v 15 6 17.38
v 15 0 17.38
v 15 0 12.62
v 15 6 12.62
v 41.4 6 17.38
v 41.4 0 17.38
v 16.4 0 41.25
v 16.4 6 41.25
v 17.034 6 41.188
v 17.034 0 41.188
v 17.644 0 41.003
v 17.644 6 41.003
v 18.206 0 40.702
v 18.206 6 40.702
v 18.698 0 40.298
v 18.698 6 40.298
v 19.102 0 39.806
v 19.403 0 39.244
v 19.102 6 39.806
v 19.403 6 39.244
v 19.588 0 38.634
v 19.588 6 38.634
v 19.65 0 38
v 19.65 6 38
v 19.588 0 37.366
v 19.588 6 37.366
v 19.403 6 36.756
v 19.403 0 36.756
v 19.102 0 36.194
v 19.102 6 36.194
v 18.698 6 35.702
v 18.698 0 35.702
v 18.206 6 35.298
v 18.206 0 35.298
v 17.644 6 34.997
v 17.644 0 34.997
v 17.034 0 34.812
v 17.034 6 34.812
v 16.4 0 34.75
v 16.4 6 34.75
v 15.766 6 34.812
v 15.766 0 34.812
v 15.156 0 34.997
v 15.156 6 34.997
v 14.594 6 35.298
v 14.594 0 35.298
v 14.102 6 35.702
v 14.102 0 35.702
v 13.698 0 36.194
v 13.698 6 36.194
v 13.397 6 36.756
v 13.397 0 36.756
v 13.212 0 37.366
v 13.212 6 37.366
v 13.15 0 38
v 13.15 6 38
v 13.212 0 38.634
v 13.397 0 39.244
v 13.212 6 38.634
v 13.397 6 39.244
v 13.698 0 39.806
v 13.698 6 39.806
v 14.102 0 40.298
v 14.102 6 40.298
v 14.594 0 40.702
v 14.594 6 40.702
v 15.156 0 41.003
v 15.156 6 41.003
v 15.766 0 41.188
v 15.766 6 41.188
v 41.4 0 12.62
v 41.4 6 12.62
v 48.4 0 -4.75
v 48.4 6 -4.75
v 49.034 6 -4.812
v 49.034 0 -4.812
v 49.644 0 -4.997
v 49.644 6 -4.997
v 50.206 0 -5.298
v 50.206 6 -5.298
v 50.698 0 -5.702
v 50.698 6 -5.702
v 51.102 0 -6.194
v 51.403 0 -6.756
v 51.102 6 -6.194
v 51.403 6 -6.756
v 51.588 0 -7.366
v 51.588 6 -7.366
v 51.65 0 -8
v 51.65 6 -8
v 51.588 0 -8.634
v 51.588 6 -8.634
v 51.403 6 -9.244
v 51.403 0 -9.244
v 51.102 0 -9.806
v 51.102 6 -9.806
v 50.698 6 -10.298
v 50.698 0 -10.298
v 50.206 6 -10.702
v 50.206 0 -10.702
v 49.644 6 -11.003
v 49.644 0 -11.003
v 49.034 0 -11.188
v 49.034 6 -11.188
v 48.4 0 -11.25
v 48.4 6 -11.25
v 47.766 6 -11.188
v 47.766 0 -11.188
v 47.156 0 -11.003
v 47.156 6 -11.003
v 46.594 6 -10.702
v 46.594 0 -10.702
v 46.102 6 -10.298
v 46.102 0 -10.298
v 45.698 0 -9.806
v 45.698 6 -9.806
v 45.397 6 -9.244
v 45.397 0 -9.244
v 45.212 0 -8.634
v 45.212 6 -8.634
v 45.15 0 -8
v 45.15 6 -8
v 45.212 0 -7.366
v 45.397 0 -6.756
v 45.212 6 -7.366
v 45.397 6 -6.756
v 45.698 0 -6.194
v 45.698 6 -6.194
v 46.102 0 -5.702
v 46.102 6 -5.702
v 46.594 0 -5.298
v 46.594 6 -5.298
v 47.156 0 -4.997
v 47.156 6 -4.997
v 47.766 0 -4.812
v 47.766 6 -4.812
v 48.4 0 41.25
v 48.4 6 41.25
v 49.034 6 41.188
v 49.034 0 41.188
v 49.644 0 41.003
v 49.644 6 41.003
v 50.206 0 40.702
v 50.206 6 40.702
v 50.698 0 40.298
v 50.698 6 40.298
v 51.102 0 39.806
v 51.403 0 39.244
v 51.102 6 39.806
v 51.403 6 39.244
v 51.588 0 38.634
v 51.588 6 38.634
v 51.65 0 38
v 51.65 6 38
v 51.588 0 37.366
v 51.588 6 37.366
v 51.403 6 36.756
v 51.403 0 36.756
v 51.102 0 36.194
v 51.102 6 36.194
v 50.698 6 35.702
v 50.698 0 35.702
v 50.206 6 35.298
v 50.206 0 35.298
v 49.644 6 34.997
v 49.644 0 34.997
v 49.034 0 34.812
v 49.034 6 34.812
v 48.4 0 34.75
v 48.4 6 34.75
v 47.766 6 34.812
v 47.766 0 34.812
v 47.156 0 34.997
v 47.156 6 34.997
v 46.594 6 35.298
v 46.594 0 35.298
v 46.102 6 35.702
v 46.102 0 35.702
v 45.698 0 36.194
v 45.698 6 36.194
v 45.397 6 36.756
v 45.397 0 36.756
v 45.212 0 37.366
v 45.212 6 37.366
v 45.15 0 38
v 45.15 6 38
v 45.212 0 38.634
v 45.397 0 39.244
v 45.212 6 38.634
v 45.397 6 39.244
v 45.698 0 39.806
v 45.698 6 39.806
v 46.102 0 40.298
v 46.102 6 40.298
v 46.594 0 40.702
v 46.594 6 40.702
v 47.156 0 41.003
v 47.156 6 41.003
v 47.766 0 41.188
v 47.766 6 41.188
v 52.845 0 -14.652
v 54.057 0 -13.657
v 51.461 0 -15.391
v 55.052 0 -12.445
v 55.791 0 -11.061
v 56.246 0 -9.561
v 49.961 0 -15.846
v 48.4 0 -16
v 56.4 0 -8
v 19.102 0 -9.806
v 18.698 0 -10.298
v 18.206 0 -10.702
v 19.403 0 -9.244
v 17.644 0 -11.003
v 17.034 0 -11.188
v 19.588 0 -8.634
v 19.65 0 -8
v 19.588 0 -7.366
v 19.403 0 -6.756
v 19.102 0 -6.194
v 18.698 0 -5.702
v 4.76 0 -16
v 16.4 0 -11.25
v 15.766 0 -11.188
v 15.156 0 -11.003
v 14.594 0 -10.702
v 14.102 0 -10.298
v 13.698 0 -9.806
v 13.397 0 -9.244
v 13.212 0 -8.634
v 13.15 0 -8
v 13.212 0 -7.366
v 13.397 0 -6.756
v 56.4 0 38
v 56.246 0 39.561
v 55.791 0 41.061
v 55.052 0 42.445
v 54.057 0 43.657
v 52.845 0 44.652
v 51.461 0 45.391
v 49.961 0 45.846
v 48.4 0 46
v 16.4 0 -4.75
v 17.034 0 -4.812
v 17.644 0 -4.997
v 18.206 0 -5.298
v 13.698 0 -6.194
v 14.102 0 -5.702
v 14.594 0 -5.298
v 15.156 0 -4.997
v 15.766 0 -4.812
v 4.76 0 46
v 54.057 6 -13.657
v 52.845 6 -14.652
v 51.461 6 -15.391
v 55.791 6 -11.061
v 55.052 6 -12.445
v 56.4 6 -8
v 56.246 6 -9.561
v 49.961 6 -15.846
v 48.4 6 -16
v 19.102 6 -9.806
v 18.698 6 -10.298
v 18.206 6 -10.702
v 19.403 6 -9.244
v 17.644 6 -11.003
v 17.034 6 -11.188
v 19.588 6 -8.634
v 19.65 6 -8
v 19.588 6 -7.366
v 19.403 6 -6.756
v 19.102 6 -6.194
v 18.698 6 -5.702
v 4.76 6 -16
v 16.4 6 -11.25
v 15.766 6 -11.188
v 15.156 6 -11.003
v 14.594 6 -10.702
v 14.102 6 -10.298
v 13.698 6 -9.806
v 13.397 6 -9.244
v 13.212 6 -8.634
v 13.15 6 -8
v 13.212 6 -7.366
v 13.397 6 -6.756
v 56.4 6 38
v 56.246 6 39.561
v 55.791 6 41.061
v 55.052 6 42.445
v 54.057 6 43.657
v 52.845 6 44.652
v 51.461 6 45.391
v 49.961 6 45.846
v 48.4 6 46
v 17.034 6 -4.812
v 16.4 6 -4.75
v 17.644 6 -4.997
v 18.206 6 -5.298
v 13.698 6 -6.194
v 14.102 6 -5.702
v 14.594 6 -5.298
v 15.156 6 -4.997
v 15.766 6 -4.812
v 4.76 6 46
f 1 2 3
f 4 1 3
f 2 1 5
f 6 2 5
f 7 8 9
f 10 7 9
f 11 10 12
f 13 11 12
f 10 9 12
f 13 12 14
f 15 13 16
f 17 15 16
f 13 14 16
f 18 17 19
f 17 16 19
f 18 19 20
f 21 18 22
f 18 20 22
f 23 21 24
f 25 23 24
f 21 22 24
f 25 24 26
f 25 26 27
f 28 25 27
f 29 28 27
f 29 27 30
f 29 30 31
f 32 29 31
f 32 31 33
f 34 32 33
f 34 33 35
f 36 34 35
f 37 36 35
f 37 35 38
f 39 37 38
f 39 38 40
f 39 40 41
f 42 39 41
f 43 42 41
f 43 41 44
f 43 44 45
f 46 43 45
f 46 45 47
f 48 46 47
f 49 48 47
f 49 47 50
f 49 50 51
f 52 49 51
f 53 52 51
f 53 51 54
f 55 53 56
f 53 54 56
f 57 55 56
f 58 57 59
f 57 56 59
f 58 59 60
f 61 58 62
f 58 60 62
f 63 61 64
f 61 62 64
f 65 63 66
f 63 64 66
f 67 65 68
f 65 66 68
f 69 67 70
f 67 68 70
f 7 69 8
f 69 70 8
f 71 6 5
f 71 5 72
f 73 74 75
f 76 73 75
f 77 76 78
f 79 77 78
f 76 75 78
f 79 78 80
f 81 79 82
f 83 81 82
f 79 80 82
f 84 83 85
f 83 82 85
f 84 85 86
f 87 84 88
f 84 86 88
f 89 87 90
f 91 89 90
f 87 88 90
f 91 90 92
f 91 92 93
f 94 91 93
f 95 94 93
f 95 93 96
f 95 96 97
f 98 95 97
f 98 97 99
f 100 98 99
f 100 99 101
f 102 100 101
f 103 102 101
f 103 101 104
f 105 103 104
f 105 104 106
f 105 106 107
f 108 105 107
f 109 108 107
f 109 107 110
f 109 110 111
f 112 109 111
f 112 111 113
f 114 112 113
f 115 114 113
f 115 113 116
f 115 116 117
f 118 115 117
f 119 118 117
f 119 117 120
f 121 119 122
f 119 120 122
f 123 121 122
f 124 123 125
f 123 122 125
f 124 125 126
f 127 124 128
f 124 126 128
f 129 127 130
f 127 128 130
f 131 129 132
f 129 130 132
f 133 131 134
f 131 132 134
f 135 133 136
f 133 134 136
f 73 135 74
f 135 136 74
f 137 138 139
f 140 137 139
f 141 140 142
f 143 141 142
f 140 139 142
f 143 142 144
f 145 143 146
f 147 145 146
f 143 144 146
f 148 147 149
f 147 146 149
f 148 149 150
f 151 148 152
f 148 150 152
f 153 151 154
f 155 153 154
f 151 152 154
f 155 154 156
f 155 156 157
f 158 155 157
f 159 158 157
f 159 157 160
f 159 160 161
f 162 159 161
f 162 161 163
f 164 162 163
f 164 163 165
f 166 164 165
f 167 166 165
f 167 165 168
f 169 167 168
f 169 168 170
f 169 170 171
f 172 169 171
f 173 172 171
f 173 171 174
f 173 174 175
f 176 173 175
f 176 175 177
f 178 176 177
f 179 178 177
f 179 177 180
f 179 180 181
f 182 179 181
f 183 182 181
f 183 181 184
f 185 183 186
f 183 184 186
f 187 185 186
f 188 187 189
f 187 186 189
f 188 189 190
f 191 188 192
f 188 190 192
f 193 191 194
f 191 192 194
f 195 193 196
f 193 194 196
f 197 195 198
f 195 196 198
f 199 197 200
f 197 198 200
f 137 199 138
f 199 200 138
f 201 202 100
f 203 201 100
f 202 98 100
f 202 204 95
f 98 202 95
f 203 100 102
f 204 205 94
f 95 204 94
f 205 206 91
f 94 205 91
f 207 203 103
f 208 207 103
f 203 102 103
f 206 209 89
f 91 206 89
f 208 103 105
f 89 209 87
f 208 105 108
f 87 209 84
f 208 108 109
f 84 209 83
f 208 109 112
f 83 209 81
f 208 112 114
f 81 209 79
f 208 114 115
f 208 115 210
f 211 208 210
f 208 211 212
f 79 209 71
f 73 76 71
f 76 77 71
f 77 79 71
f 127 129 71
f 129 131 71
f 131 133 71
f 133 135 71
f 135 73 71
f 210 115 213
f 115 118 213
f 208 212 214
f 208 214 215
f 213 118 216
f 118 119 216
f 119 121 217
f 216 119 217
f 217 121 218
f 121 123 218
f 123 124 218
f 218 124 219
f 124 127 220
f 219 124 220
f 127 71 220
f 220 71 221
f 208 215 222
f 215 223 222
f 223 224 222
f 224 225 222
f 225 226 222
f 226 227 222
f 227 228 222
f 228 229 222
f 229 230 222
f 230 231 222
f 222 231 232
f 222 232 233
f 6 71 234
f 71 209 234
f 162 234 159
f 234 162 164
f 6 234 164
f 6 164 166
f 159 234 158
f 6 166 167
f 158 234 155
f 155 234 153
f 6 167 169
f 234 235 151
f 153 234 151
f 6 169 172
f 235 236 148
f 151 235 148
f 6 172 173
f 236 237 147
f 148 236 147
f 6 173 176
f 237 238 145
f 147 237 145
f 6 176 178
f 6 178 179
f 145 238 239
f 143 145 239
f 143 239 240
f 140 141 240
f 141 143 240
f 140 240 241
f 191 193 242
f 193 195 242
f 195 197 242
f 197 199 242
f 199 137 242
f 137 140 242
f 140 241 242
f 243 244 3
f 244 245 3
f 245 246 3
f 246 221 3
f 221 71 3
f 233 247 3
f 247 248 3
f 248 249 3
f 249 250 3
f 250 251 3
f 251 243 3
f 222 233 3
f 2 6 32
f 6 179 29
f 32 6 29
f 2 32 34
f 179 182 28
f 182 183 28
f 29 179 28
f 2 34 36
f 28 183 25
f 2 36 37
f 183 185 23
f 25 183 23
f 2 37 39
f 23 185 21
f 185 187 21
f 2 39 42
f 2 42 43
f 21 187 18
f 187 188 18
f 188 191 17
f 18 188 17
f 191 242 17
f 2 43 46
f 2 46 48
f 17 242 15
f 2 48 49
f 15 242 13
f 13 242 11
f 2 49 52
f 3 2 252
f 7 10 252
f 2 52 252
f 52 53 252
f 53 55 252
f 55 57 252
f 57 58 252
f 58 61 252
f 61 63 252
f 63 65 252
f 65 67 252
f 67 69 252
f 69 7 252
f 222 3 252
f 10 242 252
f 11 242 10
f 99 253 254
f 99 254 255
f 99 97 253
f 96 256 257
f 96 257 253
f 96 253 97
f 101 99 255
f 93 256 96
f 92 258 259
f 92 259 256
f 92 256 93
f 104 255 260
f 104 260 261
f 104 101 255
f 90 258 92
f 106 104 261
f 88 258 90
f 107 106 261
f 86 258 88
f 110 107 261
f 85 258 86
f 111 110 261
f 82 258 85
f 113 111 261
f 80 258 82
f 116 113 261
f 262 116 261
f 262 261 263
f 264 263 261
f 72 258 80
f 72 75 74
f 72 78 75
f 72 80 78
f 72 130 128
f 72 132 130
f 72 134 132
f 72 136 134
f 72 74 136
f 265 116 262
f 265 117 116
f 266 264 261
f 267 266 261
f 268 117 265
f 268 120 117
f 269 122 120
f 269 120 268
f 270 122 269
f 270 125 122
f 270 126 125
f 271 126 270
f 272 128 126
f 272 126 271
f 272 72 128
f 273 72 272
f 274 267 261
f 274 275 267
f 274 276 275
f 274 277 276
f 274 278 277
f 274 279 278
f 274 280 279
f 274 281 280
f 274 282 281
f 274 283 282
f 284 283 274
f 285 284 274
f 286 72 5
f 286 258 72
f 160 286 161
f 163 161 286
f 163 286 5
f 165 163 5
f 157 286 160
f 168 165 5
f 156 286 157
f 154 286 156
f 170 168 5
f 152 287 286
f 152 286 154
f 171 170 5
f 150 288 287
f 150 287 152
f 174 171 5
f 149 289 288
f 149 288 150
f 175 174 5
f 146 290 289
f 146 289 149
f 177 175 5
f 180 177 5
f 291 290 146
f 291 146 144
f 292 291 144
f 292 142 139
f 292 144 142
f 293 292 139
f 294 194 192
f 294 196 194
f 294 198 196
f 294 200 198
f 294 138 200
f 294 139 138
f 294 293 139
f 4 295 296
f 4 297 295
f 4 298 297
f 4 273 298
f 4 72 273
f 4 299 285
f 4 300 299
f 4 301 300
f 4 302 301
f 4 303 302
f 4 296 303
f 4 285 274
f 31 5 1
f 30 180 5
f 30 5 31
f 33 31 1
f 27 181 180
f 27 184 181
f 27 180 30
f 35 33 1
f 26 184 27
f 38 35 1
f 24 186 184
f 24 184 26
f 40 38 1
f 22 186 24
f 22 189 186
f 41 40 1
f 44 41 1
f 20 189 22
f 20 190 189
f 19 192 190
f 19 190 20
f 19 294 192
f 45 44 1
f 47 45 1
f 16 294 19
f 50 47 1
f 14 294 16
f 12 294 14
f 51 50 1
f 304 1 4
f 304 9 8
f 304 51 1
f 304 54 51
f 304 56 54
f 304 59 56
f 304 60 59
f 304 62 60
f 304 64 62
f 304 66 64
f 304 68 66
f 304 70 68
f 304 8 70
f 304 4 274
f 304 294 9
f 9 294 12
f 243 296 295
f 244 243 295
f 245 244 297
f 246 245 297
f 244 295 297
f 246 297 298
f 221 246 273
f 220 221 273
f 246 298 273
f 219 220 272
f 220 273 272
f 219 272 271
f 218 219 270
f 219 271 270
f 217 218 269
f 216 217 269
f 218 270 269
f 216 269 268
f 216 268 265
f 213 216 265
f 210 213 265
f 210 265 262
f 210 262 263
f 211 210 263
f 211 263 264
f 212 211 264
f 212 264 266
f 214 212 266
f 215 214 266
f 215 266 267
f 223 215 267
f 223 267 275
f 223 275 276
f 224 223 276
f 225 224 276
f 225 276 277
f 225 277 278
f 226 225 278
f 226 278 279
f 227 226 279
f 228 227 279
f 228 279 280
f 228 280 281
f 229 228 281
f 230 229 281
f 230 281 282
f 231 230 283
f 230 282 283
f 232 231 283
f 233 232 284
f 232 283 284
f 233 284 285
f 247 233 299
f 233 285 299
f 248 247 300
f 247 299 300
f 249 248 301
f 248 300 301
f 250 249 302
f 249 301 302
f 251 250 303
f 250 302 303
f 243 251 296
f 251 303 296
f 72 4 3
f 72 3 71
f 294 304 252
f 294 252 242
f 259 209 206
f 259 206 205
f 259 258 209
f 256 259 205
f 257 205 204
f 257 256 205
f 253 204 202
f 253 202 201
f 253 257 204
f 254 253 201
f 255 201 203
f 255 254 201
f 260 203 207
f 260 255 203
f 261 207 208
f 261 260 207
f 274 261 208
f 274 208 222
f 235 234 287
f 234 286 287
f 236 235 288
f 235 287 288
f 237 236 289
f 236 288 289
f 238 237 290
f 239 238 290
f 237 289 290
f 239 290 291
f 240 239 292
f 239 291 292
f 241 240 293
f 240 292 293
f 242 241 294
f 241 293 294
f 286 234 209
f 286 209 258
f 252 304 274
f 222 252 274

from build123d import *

# Parameters (mm, degrees)
RESSALTO_EXTRUS_O1_DEPTH = 30
ESBO_O2_W                = 12
ESBO_O2_H                = 94
CORTE_EXTRUS_O1_DEPTH    = 118.541482039
ESBO_O3_W                = 30
ESBO_O3_H                = 10
CORTE_EXTRUS_O2_DEPTH    = 118.541482039
ESBO_O4_W                = 3.6
ESBO_O4_H                = 30
CORTE_EXTRUS_O3_DEPTH    = 108.498837203
ESBO_O5_W                = 56.4
ESBO_O5_H                = 6
RESSALTO_EXTRUS_O2_DEPTH = 16
ESBO_O6_W                = 56.4
ESBO_O6_H                = 6
RESSALTO_EXTRUS_O3_DEPTH = 16
FILETE1_R                = 8
FILETE2_R                = 8
FILETE3_R                = 8
FILETE4_R                = 4
ESBO_O7_R                = 3.175
CORTE_EXTRUS_O4_DEPTH    = 113.943171551
ESBO_O8_R                = 3.25
CORTE_EXTRUS_O5_DEPTH    = 112.143870726
ESBO_O9_W                = 56.4
ESBO_O9_H                = 62
CORTE_EXTRUS_O6_DEPTH    = 112.143870726
ESBO_O10_W               = 26.4
ESBO_O10_H               = 4.76
CORTE_EXTRUS_O7_DEPTH    = 74.027118251
ESBO_O11_W               = 4.76
ESBO_O11_H               = 62
CORTE_EXTRUS_O8_DEPTH    = 74.027118251


with BuildPart() as part:
    # Esboço1 → Ressalto-extrusão1 (new body)
    with BuildSketch(Plane.XY):
        Polygon((0, 0), (0, 100), (60, 0), align=None)
    extrude(amount=RESSALTO_EXTRUS_O1_DEPTH)

    # Esboço2 → Corte-extrusão1 (cut, through all)
    with BuildSketch(Plane.ZY.offset(-6)):
        with Locations((24, 53)):
            Rectangle(ESBO_O2_W, ESBO_O2_H)
        with Locations((6, 53)):
            Rectangle(ESBO_O2_W, ESBO_O2_H)
    extrude(amount=-CORTE_EXTRUS_O1_DEPTH, mode=Mode.SUBTRACT)

    # Esboço3 → Corte-extrusão2 (cut, through all)
    with BuildSketch(Plane(origin=(6, 0, 0), x_dir=(0, 0, -1), z_dir=(1, 0, 0))):
        with Locations((-15, 95)):
            Rectangle(ESBO_O3_W, ESBO_O3_H)
    extrude(amount=-CORTE_EXTRUS_O2_DEPTH, mode=Mode.SUBTRACT)

    # Esboço4 → Corte-extrusão3 (cut, through all)
    with BuildSketch(Plane(origin=(0, 6, 0), x_dir=(1, 0, 0), z_dir=(0, 1, 0))):
        with Locations((58.2, -15)):
            Rectangle(ESBO_O4_W, ESBO_O4_H)
    extrude(amount=-CORTE_EXTRUS_O3_DEPTH, mode=Mode.SUBTRACT)

    # Esboço5 → Ressalto-extrusão2 (add)
    with BuildSketch(Plane.XY.offset(30)):
        with Locations((28.2, 3)):
            Rectangle(ESBO_O5_W, ESBO_O5_H)
    extrude(amount=RESSALTO_EXTRUS_O2_DEPTH)

    # Esboço6 → Ressalto-extrusão3 (add)
    with BuildSketch(Plane(origin=(0, 0, 0), x_dir=(-1, 0, 0), z_dir=(0, 0, -1))):
        with Locations((-28.2, 3)):
            Rectangle(ESBO_O6_W, ESBO_O6_H)
    extrude(amount=RESSALTO_EXTRUS_O3_DEPTH)

    # Filete1
    filete1_edges = [part.edges().sort_by_distance(p)[0] for p in [
        (3, 6, 0),
        (3, 6, 30),
    ]]
    fillet(filete1_edges, radius=FILETE1_R)

    # Filete2
    filete2_edges = [part.edges().sort_by_distance(p)[0] for p in [
        (56.4, 3, -16),
        (56.4, 3, 46),
    ]]
    fillet(filete2_edges, radius=FILETE2_R)

    # Filete3
    filete3_edges = [part.edges().sort_by_distance(p)[0] for p in [
        (3, 90, 30),
        (3, 90, 0),
    ]]
    fillet(filete3_edges, radius=FILETE3_R)

    # Filete4
    filete4_edges = [part.edges().sort_by_distance(p)[0] for p in [
        (31.2, 6, 18),
        (31.2, 6, 12),
    ]]
    fillet(filete4_edges, radius=FILETE4_R)

    # Esboço7 → Corte-extrusão4 (cut, through all)
    with BuildSketch(Plane(origin=(6, 0, 0), x_dir=(0, 0, -1), z_dir=(1, 0, 0))):
        with Locations((-23, 78)):
            Circle(ESBO_O7_R)
        with Locations((-23, 48)):
            Circle(ESBO_O7_R)
        with Locations((-23, 18)):
            Circle(ESBO_O7_R)
        with Locations(Location((-7, 18, 0), (0, 0, 180))):
            Circle(ESBO_O7_R)
        with Locations(Location((-7, 48, 0), (0, 0, 180))):
            Circle(ESBO_O7_R)
        with Locations(Location((-7, 78, 0), (0, 0, 180))):
            Circle(ESBO_O7_R)
    extrude(amount=-CORTE_EXTRUS_O4_DEPTH, mode=Mode.SUBTRACT)

    # Esboço8 → Corte-extrusão5 (cut, through all)
    with BuildSketch(Plane(origin=(0, 6, 0), x_dir=(1, 0, 0), z_dir=(0, 1, 0))):
        with Locations(Location((48.4, 8, 0), (0, 0, 270))):
            Circle(ESBO_O8_R)
        with Locations(Location((48.4, -38, 0), (0, 0, 270))):
            Circle(ESBO_O8_R)
        with Locations(Location((16.4, -38, 0), (0, 0, 270))):
            Circle(ESBO_O8_R)
        with Locations(Location((16.4, 8, 0), (0, 0, 270))):
            Circle(ESBO_O8_R)
    extrude(amount=-CORTE_EXTRUS_O5_DEPTH, mode=Mode.SUBTRACT)

    # Esboço9 → Corte-extrusão6 (cut, through all)
    with BuildSketch(Plane(origin=(0, 6, 0), x_dir=(1, 0, 0), z_dir=(0, 1, 0))):
        with Locations((28.2, -15)):
            Rectangle(ESBO_O9_W, ESBO_O9_H)
    extrude(amount=CORTE_EXTRUS_O6_DEPTH, mode=Mode.SUBTRACT)

    # Esboço10 → Corte-extrusão7 (cut, through all)
    with BuildSketch(Plane(origin=(0, 6, 0), x_dir=(1, 0, 0), z_dir=(0, 1, 0))):
        with Locations((28.2, -15)):
            Rectangle(ESBO_O10_W, ESBO_O10_H)
    extrude(amount=-CORTE_EXTRUS_O7_DEPTH, mode=Mode.SUBTRACT)

    # Esboço11 → Corte-extrusão8 (cut, through all)
    with BuildSketch(Plane(origin=(0, 6, 0), x_dir=(1, 0, 0), z_dir=(0, 1, 0))):
        with Locations((2.38, -15)):
            Rectangle(ESBO_O11_W, ESBO_O11_H)
    extrude(amount=-CORTE_EXTRUS_O8_DEPTH, mode=Mode.SUBTRACT)


solid = part.part
